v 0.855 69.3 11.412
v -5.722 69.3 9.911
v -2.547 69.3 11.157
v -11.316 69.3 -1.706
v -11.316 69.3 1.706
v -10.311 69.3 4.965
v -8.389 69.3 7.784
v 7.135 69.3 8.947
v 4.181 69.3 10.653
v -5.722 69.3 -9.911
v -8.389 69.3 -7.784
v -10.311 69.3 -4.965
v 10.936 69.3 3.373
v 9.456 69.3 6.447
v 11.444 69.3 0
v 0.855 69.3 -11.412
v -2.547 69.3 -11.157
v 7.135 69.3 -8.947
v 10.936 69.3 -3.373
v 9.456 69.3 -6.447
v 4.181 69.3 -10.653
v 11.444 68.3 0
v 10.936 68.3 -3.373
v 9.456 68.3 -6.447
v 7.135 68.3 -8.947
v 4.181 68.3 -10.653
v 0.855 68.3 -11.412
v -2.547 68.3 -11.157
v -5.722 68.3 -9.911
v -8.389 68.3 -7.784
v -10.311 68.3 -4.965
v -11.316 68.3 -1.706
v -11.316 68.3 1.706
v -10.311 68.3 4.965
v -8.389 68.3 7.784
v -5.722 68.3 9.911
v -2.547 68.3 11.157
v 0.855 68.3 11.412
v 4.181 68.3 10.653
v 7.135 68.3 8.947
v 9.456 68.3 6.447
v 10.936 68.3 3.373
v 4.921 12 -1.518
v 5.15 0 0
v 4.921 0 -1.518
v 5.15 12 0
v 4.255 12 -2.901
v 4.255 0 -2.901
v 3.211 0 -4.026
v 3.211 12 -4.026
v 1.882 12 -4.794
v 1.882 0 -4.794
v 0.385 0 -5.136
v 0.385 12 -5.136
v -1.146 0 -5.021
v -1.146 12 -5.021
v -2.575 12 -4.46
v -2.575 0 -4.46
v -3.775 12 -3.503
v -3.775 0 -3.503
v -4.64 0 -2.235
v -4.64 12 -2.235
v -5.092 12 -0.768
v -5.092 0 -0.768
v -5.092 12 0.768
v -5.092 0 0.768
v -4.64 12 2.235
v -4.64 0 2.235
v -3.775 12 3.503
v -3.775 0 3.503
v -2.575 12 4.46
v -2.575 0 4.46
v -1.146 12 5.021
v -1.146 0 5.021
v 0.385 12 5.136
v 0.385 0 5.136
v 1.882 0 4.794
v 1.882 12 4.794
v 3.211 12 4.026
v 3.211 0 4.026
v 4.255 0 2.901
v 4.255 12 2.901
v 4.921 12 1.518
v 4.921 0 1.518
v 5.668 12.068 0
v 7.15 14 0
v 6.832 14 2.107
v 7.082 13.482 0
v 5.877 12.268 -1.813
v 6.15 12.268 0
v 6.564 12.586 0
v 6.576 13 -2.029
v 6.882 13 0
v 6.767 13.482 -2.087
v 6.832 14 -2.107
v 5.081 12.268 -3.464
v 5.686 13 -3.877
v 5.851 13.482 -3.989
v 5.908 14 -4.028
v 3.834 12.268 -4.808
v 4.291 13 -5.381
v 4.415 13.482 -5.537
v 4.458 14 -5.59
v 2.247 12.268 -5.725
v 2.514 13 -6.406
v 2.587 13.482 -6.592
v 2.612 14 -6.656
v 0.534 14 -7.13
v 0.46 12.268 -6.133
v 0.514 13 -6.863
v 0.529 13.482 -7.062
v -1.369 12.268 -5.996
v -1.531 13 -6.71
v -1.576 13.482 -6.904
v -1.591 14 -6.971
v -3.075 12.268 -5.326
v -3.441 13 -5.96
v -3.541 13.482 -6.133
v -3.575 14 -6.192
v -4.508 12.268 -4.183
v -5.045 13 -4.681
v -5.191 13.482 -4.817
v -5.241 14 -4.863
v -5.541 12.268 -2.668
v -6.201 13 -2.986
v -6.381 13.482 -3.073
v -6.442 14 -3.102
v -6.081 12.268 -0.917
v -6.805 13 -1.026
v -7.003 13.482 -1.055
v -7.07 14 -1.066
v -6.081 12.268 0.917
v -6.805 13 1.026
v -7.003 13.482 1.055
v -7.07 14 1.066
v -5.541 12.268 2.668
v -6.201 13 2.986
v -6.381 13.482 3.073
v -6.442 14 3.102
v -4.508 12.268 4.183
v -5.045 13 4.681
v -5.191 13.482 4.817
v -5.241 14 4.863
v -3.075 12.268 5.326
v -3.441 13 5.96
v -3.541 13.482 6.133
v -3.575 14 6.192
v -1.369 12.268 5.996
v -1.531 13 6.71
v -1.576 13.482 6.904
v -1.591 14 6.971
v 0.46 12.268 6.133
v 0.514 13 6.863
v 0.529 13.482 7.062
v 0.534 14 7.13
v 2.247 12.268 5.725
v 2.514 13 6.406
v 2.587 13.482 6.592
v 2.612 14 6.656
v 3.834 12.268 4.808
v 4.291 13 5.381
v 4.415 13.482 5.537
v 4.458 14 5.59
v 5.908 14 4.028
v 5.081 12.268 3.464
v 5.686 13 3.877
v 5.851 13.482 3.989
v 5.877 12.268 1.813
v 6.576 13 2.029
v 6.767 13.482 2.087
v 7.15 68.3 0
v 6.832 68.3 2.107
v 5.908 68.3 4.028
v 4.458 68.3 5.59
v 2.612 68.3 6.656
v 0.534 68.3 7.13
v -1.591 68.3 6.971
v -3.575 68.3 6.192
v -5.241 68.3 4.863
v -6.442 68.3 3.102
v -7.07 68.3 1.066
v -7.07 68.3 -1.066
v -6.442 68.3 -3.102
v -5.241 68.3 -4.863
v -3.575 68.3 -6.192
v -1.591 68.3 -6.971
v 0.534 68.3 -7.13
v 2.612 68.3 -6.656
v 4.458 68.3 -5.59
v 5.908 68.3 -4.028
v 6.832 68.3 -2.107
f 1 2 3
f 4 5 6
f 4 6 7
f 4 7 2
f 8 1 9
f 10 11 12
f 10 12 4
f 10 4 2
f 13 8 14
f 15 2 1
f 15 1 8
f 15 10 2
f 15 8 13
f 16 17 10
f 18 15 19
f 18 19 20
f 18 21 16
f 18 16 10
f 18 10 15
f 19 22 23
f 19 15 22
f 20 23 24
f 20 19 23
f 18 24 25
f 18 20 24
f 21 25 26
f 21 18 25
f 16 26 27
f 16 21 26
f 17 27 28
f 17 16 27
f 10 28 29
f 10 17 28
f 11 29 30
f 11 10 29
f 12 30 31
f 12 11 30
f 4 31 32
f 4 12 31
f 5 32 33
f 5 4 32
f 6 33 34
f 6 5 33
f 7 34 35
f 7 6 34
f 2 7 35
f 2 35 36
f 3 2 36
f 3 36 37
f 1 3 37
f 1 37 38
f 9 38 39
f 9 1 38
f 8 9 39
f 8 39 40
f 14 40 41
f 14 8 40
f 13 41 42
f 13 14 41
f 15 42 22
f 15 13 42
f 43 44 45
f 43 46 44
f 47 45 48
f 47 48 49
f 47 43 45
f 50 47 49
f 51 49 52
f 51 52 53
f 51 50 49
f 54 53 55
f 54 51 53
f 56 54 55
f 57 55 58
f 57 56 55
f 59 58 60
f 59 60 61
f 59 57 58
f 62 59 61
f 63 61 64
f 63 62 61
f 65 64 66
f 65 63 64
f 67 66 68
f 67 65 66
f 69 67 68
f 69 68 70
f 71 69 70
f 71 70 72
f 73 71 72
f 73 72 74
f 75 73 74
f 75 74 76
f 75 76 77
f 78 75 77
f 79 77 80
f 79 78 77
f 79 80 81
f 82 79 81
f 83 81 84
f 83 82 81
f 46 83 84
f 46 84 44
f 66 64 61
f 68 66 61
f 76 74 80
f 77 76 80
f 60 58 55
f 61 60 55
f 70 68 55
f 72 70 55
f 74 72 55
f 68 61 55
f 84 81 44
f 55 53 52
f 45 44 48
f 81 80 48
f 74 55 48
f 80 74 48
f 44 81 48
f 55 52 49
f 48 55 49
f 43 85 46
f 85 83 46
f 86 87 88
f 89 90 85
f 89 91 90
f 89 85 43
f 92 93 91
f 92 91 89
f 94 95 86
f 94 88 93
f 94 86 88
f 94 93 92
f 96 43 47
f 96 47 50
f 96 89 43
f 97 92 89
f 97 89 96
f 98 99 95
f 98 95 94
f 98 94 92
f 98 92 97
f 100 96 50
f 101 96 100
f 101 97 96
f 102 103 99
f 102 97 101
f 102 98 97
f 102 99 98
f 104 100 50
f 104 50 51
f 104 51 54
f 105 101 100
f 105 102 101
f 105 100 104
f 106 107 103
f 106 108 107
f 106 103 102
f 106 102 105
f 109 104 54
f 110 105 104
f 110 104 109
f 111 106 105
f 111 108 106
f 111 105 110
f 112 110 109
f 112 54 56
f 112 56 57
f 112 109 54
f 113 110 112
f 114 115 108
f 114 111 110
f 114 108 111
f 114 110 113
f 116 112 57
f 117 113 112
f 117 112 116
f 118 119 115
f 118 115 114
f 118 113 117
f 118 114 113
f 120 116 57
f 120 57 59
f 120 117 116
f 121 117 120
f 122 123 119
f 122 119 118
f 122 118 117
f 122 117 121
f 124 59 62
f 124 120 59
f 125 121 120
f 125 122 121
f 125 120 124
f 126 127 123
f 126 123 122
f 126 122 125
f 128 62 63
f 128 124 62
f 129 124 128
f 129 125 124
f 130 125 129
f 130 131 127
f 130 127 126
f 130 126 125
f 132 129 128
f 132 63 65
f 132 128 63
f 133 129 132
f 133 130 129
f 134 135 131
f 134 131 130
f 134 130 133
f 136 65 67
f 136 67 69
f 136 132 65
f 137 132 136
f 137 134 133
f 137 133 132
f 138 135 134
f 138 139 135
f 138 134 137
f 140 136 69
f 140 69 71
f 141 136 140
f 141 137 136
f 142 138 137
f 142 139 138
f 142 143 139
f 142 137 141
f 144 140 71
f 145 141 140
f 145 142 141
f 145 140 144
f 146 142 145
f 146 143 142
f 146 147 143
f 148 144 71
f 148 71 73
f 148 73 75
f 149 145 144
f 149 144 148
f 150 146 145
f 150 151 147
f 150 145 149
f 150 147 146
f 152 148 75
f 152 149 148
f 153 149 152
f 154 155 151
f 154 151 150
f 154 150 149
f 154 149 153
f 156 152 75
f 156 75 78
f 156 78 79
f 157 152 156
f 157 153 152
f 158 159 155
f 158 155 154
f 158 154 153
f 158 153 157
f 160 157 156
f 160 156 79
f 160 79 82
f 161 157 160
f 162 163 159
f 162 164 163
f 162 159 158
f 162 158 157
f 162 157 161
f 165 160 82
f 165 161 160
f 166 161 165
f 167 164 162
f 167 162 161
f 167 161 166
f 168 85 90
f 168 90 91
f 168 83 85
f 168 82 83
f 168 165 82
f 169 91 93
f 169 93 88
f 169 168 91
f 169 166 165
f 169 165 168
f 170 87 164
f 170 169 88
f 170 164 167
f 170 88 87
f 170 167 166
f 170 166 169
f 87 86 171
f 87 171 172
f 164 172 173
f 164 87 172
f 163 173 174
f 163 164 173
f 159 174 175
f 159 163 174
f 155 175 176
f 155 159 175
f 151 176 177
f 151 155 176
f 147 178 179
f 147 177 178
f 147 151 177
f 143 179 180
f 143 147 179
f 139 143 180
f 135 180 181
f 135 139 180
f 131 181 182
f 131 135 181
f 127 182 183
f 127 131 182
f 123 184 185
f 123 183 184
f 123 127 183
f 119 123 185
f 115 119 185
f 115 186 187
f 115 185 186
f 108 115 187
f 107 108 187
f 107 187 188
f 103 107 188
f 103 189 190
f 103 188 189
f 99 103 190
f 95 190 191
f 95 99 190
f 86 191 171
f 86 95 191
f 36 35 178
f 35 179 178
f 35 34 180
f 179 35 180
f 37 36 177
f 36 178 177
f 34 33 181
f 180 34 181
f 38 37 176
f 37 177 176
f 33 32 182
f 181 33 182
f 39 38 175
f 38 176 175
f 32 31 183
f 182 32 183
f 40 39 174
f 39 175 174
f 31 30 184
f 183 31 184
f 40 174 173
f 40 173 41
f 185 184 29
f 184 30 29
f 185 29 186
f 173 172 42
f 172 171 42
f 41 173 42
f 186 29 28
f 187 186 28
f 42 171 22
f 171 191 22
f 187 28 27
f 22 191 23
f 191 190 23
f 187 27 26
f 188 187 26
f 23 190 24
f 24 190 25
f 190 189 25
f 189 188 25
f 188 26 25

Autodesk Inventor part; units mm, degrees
ref_plane "YZ Plane" through (0, 0, 0) normal (1, 0, 0) x (0, 1, 0)
ref_plane "XZ Plane" through (0, 0, 0) normal (0, 1, 0) x (-1, 0, 0)
ref_plane "XY Plane" through (0, 0, 0) normal (0, 0, 1) x (1, 0, 0)
sketch "Skizze1" plane through (0, 0, 0) normal (0, 0, 1) x (1, 0, 0)
  line L0 (0, 0) -> (5.15, 0)
  line L1 (5.15, 0) -> (5.15, 12)
  line L2 (0, 0) -> (0, 68.3)
  line L3 (0, 68.3) -> (7.15, 68.3)
  line L4 (7.15, 68.3) -> (7.15, 14)
  line L5 (5.15, 12) -> (5.15, 12)
  arc A0 (5.15, 12) -> (7.15, 14) centre (5.15, 14) ccw
  line L6 (7.15, 68.3) -> (11.4441, 68.3)
  line L7 (11.4441, 68.3) -> (11.4441, 69.3)
  line L8 (11.4441, 69.3) -> (0, 69.3)
  line L9 (0, 69.3) -> (0, 68.3)
  dimension "d0" = 5.15
  dimension "d1" = 12
  dimension "d2" = 68.3
  dimension "d3" = 7.15
  dimension "d4" = 2
  dimension "d5" = 1
revolve "Umdrehung1" add sketch "Skizze1" angle 360 about axis through (0, 0, 0) along (0, 1, 0)
properties part number "00_5ml_glue_cartridge"
